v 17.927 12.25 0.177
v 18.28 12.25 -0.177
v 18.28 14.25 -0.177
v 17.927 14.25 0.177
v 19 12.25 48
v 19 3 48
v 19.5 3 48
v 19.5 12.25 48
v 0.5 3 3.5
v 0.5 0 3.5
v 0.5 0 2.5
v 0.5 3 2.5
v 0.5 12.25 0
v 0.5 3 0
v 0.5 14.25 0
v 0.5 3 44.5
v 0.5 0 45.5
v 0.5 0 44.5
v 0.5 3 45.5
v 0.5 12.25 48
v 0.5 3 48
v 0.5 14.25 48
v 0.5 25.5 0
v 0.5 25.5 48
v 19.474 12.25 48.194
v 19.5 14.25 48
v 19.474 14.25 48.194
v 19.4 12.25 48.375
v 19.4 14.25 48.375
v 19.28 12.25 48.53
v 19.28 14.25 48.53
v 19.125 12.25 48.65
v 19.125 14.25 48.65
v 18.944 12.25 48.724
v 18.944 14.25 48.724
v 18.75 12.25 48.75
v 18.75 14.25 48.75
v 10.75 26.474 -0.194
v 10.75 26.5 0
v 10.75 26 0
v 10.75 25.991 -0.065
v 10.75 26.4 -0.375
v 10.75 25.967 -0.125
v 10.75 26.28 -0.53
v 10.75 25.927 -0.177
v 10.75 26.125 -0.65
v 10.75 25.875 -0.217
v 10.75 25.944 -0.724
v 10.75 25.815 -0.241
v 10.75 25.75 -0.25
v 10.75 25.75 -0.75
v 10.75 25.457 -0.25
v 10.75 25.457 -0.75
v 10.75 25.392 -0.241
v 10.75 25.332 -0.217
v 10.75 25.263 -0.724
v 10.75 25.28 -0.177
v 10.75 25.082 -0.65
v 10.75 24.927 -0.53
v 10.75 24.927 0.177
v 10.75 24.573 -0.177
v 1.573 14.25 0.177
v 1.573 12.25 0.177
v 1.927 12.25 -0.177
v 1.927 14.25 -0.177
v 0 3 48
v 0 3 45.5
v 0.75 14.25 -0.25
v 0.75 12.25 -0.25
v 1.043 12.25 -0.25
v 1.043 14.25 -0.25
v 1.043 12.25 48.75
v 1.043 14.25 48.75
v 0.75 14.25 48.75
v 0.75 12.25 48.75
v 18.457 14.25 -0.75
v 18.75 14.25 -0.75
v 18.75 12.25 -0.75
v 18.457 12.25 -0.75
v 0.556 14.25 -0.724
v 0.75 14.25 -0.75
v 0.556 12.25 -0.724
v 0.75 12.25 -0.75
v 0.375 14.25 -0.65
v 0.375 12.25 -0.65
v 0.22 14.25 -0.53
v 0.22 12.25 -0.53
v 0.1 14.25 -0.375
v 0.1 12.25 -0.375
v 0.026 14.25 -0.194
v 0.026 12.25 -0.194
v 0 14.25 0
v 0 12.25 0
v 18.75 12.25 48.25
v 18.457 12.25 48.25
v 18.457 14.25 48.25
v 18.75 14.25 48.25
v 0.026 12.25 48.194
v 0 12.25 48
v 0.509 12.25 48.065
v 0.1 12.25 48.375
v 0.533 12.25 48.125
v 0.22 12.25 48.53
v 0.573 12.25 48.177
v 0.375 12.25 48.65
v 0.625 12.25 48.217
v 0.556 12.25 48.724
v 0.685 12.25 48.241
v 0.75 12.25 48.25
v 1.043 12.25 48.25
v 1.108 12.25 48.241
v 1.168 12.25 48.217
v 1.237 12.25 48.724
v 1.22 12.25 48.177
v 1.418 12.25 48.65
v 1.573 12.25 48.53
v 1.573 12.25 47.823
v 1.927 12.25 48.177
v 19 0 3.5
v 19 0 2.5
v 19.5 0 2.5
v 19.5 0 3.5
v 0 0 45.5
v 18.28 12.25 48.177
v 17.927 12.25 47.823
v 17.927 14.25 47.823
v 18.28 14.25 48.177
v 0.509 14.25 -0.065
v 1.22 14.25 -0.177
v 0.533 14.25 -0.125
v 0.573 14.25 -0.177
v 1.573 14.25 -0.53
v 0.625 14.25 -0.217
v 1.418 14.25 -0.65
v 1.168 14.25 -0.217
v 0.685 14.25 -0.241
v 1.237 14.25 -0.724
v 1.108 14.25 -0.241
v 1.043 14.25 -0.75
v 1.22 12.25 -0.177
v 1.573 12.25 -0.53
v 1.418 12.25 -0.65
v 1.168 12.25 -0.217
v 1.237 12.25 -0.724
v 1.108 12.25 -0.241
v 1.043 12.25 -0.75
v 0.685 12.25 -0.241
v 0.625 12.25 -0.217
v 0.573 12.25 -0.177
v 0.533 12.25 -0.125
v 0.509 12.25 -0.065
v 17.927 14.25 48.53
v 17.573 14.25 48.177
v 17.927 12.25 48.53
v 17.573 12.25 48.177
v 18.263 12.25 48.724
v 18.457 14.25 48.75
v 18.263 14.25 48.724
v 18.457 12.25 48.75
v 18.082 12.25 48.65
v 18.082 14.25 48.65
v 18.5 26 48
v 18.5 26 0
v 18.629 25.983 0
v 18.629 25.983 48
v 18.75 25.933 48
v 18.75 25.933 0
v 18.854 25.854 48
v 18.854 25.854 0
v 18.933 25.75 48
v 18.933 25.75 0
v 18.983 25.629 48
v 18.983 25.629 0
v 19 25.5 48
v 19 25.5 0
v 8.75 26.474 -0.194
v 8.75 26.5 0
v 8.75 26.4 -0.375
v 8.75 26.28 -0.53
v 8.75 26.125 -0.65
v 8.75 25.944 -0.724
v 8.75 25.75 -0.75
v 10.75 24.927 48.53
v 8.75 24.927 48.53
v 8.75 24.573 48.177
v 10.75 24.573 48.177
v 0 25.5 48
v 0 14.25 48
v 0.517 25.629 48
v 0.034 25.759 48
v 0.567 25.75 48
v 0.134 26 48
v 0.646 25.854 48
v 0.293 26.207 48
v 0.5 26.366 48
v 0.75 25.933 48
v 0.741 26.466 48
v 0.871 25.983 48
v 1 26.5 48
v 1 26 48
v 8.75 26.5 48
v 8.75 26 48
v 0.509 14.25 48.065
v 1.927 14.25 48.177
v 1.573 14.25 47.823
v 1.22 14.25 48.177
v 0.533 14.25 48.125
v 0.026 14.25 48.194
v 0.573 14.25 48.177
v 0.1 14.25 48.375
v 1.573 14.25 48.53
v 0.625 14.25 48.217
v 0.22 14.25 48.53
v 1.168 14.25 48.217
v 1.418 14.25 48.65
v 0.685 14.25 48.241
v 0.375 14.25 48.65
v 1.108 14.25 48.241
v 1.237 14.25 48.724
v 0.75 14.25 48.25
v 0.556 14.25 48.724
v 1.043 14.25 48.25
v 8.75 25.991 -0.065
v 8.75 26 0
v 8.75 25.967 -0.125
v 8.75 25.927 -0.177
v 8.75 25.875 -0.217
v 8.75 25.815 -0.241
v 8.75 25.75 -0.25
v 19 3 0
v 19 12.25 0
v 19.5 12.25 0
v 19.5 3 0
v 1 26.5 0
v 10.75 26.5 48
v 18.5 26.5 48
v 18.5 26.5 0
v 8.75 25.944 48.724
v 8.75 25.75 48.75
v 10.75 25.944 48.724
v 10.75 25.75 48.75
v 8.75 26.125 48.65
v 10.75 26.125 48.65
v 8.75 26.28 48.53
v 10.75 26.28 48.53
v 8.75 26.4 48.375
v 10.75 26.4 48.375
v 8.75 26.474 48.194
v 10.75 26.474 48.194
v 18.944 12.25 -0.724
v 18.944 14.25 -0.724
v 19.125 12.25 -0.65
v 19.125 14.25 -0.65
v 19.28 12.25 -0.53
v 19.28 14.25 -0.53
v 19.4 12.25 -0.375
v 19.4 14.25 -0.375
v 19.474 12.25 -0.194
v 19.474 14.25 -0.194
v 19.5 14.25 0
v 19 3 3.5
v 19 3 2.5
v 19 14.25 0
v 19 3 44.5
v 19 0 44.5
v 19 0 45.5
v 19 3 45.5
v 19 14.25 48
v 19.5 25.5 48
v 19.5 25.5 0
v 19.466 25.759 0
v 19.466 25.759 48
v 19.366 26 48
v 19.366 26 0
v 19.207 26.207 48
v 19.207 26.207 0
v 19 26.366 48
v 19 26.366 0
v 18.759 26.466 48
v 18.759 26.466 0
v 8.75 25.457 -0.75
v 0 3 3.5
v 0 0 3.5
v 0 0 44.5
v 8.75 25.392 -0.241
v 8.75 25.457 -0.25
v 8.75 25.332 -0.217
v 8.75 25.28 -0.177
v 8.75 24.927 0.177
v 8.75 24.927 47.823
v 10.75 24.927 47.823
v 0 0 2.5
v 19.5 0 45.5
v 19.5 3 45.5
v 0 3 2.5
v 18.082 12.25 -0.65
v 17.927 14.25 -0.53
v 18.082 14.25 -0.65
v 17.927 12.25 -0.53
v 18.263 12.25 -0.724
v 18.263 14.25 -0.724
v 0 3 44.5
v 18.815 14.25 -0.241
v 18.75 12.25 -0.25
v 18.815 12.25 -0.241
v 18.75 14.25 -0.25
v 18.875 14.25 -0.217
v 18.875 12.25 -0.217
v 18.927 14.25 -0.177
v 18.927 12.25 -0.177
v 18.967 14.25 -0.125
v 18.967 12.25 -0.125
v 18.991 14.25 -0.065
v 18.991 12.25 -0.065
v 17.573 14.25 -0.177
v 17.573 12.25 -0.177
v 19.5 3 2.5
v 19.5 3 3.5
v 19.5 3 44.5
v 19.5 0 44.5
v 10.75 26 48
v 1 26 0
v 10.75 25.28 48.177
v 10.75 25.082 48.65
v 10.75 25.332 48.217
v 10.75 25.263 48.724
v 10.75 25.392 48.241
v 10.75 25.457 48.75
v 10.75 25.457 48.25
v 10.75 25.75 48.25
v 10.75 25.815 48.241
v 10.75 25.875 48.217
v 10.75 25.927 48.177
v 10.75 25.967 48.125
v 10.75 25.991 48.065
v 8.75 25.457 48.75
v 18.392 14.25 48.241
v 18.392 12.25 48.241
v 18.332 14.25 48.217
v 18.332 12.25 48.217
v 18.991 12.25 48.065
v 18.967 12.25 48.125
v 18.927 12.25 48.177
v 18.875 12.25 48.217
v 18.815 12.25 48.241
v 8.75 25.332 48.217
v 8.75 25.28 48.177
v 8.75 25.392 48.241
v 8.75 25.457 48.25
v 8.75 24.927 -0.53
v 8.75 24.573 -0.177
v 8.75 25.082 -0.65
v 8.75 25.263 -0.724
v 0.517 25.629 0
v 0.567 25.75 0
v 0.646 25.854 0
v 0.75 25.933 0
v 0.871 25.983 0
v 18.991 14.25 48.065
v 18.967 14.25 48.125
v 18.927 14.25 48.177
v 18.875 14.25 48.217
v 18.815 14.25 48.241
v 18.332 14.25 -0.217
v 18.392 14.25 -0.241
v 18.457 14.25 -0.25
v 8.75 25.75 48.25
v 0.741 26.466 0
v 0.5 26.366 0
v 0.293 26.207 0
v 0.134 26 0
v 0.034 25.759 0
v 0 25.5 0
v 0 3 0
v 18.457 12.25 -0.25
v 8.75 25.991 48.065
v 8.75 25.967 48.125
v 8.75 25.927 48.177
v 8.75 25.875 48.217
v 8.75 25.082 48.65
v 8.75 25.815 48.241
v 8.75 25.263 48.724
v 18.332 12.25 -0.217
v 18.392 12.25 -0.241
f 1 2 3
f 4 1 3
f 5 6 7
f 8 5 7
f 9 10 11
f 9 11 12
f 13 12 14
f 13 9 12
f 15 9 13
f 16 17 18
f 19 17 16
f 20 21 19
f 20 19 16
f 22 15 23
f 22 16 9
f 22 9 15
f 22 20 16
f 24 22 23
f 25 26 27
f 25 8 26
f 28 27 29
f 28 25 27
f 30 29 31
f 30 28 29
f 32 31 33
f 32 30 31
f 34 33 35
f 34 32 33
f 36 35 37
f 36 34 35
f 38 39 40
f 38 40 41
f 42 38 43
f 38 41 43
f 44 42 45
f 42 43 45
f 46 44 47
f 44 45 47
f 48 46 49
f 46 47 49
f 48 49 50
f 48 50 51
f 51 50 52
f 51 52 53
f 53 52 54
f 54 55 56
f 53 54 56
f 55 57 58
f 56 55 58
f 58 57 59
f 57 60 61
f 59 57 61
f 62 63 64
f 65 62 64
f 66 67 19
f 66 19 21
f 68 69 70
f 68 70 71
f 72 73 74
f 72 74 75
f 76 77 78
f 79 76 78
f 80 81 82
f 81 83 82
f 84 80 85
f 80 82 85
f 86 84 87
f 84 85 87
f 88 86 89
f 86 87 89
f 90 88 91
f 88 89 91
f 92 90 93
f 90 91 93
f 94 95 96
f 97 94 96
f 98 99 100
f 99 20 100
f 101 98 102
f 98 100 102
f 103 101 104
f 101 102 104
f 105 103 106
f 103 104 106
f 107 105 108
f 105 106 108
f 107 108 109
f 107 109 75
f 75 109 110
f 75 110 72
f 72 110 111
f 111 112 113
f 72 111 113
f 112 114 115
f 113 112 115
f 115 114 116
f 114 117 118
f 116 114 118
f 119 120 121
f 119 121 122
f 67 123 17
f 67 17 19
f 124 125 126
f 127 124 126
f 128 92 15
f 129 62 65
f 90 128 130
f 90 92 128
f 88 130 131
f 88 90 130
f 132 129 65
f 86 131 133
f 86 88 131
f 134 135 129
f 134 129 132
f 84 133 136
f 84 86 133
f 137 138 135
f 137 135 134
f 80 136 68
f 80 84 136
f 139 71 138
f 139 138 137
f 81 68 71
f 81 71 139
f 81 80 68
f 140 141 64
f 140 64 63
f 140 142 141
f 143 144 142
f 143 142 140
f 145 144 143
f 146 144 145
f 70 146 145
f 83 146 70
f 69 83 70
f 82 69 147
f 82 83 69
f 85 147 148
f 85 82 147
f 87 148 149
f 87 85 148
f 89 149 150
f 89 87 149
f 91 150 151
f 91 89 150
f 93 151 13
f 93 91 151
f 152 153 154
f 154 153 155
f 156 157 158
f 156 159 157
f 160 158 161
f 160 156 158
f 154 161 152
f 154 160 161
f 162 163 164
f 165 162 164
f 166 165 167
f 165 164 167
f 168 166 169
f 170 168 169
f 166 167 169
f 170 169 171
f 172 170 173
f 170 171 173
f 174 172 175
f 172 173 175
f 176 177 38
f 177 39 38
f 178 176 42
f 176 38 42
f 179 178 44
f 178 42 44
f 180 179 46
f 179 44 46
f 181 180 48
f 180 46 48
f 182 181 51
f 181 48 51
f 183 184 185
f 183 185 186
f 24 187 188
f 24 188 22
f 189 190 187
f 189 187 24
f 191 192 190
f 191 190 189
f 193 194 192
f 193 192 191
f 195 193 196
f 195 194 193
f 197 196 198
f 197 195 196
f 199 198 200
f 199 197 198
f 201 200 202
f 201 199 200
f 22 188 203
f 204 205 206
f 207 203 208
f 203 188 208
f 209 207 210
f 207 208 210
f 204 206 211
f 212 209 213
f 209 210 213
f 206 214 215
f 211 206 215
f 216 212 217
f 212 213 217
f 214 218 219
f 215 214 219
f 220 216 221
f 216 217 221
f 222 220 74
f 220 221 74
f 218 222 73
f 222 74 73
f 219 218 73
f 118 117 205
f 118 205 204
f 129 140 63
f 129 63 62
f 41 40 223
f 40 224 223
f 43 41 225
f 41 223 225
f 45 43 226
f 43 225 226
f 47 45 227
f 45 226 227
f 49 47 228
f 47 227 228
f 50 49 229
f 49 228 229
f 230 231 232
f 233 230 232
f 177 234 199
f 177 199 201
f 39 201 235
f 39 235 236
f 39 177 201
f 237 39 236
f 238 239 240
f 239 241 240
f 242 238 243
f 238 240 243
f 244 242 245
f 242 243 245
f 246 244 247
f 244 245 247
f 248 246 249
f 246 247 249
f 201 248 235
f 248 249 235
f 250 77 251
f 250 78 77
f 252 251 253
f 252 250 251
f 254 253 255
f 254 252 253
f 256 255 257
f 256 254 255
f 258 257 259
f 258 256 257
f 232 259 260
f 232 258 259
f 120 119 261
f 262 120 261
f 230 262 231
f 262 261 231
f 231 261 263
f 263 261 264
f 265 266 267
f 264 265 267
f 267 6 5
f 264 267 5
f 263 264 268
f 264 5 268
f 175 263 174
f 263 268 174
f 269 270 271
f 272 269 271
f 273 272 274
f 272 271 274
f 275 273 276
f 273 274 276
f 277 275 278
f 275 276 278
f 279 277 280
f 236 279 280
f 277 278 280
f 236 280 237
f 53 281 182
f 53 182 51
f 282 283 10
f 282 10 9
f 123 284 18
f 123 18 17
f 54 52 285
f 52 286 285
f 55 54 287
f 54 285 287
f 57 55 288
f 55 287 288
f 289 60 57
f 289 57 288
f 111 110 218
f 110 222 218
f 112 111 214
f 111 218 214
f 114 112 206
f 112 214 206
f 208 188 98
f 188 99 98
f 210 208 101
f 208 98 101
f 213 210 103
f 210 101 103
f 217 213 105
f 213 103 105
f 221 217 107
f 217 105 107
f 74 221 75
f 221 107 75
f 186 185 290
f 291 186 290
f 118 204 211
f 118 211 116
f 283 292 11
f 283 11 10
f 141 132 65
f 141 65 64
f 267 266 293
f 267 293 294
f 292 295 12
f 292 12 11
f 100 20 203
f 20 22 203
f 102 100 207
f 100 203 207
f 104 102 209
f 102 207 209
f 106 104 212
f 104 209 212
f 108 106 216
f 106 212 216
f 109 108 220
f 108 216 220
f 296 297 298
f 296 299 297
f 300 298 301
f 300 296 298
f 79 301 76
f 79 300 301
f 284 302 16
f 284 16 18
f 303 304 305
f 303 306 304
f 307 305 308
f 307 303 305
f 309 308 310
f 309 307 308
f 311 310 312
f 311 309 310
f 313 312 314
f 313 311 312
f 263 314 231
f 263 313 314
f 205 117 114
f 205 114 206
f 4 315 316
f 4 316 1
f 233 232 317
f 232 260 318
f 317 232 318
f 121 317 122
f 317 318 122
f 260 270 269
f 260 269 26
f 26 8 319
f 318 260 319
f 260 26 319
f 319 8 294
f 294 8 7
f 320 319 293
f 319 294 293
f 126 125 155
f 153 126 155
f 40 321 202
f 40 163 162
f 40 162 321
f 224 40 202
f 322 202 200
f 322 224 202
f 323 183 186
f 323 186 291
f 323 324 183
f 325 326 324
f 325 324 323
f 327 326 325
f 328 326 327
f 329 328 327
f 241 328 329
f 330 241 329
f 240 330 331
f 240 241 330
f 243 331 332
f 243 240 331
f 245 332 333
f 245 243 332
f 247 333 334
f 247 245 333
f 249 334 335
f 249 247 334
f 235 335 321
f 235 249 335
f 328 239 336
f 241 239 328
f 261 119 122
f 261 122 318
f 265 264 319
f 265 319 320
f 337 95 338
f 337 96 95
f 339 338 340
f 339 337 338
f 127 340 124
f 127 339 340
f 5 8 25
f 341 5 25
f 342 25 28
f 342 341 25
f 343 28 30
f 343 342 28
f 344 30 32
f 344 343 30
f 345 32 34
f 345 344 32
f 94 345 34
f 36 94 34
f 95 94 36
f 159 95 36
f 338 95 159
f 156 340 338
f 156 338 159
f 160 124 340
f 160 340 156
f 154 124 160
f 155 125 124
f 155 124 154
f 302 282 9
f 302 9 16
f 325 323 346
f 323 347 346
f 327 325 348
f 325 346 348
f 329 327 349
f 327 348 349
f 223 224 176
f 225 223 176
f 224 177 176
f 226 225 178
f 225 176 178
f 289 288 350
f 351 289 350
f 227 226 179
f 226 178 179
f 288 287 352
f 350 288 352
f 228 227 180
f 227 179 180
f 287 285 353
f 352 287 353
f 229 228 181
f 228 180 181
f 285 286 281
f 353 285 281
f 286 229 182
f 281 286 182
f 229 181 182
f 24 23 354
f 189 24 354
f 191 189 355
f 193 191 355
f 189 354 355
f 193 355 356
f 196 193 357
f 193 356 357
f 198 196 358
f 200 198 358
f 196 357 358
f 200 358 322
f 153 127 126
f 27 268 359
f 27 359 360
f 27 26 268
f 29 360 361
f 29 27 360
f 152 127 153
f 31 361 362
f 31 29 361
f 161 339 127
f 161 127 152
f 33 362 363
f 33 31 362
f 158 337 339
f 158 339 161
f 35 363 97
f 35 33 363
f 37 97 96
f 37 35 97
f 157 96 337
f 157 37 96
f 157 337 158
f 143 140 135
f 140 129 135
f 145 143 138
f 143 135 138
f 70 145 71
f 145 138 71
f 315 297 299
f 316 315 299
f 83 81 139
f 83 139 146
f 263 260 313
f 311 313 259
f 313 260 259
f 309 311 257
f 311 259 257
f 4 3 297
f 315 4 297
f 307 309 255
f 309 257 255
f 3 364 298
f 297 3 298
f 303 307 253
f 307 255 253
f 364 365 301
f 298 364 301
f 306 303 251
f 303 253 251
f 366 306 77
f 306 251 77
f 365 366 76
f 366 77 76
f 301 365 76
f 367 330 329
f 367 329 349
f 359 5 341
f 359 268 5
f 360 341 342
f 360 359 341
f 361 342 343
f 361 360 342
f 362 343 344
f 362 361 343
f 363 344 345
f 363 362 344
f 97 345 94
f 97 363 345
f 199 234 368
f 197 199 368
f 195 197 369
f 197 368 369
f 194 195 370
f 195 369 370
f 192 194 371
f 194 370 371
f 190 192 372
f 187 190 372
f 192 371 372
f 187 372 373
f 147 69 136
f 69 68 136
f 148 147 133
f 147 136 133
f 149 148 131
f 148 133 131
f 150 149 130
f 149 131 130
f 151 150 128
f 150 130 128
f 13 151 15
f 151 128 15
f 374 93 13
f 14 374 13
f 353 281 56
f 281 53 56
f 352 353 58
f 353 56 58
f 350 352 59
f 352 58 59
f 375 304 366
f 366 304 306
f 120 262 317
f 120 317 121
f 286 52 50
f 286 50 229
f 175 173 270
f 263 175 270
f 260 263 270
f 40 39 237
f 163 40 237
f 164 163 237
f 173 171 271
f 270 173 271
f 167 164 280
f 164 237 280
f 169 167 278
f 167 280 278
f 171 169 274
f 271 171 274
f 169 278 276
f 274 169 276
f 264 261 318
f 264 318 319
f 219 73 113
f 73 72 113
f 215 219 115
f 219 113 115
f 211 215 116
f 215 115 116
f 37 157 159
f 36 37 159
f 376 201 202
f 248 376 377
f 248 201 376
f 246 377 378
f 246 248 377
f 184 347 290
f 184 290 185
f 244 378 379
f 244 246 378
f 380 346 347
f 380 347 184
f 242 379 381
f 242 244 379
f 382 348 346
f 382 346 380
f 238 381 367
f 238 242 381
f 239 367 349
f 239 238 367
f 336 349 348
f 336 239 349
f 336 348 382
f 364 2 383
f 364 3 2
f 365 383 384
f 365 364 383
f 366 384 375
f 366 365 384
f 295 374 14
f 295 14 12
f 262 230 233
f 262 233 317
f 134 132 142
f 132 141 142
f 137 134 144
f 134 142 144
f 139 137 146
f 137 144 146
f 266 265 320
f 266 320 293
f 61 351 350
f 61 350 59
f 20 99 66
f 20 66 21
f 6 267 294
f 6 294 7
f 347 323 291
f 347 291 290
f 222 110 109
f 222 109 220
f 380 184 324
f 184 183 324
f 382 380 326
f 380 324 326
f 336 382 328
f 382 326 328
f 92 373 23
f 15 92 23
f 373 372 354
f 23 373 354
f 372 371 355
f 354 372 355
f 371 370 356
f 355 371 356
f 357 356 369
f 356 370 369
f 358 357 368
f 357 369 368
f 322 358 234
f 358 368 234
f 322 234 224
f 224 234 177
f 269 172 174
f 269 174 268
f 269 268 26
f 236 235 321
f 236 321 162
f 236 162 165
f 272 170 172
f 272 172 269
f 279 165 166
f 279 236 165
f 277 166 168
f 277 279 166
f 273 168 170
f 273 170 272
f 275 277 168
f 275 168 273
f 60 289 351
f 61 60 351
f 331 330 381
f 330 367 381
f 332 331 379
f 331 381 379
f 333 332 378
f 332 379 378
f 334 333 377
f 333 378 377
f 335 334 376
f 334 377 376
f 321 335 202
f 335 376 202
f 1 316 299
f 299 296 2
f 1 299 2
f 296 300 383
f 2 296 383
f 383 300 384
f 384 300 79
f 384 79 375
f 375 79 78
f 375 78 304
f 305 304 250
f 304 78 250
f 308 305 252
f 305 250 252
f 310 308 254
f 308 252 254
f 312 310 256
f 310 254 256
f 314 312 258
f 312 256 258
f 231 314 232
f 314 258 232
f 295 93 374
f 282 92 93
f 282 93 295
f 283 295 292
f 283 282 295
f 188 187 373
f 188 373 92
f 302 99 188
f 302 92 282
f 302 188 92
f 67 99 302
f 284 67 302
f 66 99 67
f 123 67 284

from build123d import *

# Parameters (mm, degrees)
EXTRUDE_1_DEPTH     = 48
SKETCH_3_W          = 2
SKETCH_3_H          = 3.503465233
EXTRUDE_2_DEPTH     = 0.5
SKETCH_4_W          = 2
SKETCH_4_H          = 3.503465233
EXTRUDE_3_DEPTH     = 0.5
SKETCH_7_W          = 0.5
SKETCH_7_H          = 3.503465233
CUT_EXTRUDE_2_DEPTH = 66.5
SKETCH_10_W         = 2
SKETCH_10_H         = 0.5
CUT_EXTRUDE_3_DEPTH = 66.5
SKETCH_13_W         = 0.5
SKETCH_13_H         = 2
SKETCH_16_W         = 0.5
SKETCH_16_H         = 2


with BuildPart() as part:
    # Эскиз1 → Бобышка-Вытянуть1 (new body)
    with BuildSketch(Plane.XY):
        with BuildLine():
            Line((0.5, 0), (0.5, 25.5))
            ThreePointArc((0.5, 25.5), (0.646446609, 25.853553391), (1, 26))
            Line((1, 26), (18.5, 26))
            ThreePointArc((18.5, 26), (18.853553391, 25.853553391), (19, 25.5))
            Line((19, 25.5), (19, 0))
            Line((19, 0), (19.5, 0))
            Line((19.5, 0), (19.5, 25.5))
            ThreePointArc((19.5, 25.5), (19.207106781, 26.207106781), (18.5, 26.5))
            Line((18.5, 26.5), (1, 26.5))
            ThreePointArc((1, 26.5), (0.292893219, 26.207106781), (0, 25.5))
            Line((0, 25.5), (0, 0))
            Line((0, 0), (0.5, 0))
        make_face()
    extrude(amount=EXTRUDE_1_DEPTH)

    # Эскиз3 → Бобышка-Вытянуть2 (add)
    with BuildSketch(Plane.ZY):
        with Locations((45, -1.751732617)):
            Rectangle(SKETCH_3_W, SKETCH_3_H)
        with Locations((3, -1.751732617)):
            Rectangle(SKETCH_3_W, SKETCH_3_H)
    extrude(amount=-EXTRUDE_2_DEPTH)

    # Эскиз4 → Бобышка-Вытянуть3 (add)
    with BuildSketch(Plane(origin=(19.5, 0, 0), x_dir=(0, 0, -1), z_dir=(1, 0, 0))):
        with Locations((-45, -1.751732617)):
            Rectangle(SKETCH_4_W, SKETCH_4_H)
        with Locations((-3, -1.751732617)):
            Rectangle(SKETCH_4_W, SKETCH_4_H)
    extrude(amount=-EXTRUDE_3_DEPTH)

    # Эскиз7 → Вырез-Вытянуть2 (cut)
    with BuildSketch(Plane.ZY):
        with Locations((45.75, -1.751732617)):
            Rectangle(SKETCH_7_W, SKETCH_7_H)
        with Locations((3.75, -1.751732617)):
            Rectangle(SKETCH_7_W, SKETCH_7_H)
        with Locations((44.25, -1.751732617)):
            Rectangle(SKETCH_7_W, SKETCH_7_H)
        with Locations((2.25, -1.751732617)):
            Rectangle(SKETCH_7_W, SKETCH_7_H)
    extrude(amount=-CUT_EXTRUDE_2_DEPTH, mode=Mode.SUBTRACT)

    # По траектории2: sweep along a path in Эскиз9
    with BuildLine(Plane.ZY) as sweep_2_path:
        Line((48, 24.75), (48.353553391, 25.103553391))
        ThreePointArc((48.353553391, 25.103553391), (48.461939766, 25.265765065), (48.5, 25.457106781))
        Line((48.5, 25.457106781), (48.5, 25.75))
        ThreePointArc((48.5, 25.75), (48.353553391, 26.103553391), (48, 26.25))
        Line((48, 26.25), (0, 26.25))
        ThreePointArc((0, 26.25), (-0.353553391, 26.103553391), (-0.5, 25.75))
        Line((-0.5, 25.75), (-0.5, 25.457106781))
        ThreePointArc((-0.5, 25.457106781), (-0.461939766, 25.265765065), (-0.353553391, 25.103553391))
        Line((-0.353553391, 25.103553391), (0, 24.75))
    # Эскиз10 → По траектории2 (sweep)
    with BuildSketch(Plane(origin=(0, 24.75, 48), x_dir=(1, 0, 0), z_dir=(0, 0.7071067811865477, 0.7071067811865475))):
        with Locations((9.75, 0)):
            Rectangle(SKETCH_10_W, SKETCH_10_H)
    sweep(path=sweep_2_path.line)

    # Эскиз14 → Вырез-Вытянуть3 (cut)
    with BuildSketch(Plane.ZY):
        Polygon((2.5, 0), (3.5, 0), (3.5, 3), (44.5, 3), (44.5, 0), (45.5, 0), (45.5, 3), (48, 3), (48, 0), (46.949999013, 0), (46.949999013, -4.072410454), (1.67699977, -4.072410454), (1.67699977, 0), (0, 0), (0, 3), (2.5, 3), align=None)
    extrude(amount=-CUT_EXTRUDE_3_DEPTH, mode=Mode.SUBTRACT)

    # По траектории3: sweep along a path in Эскиз11
    with BuildLine(Plane(origin=(0, 26.5, 0), x_dir=(1, 0, 0), z_dir=(0, 1, 0))) as sweep_3_path:
        Line((17.75, 0), (18.103553391, 0.353553391))
        ThreePointArc((18.103553391, 0.353553391), (18.265765065, 0.461939766), (18.457106781, 0.5))
        Line((18.457106781, 0.5), (18.75, 0.5))
        ThreePointArc((18.75, 0.5), (19.103553391, 0.353553391), (19.25, 0))
        Line((19.25, 0), (19.25, -48))
        ThreePointArc((19.25, -48), (19.103553391, -48.353553391), (18.75, -48.5))
        Line((18.75, -48.5), (18.457106781, -48.5))
        ThreePointArc((18.457106781, -48.5), (18.265765065, -48.461939766), (18.103553391, -48.353553391))
        Line((18.103553391, -48.353553391), (17.75, -48))
    # Эскиз13 → По траектории3 (sweep)
    with BuildSketch(Plane(origin=(17.75, 26.5, 0), x_dir=(0.7071067811865498, 0, 0.7071067811865454), z_dir=(-0.7071067811865454, 0, 0.7071067811865498))):
        with Locations((0, -13.25)):
            Rectangle(SKETCH_13_W, SKETCH_13_H)
    sweep(path=sweep_3_path.line)

    # По траектории4: sweep along a path in Эскиз15
    with BuildLine(Plane(origin=(0, 26.5, 0), x_dir=(1, 0, 0), z_dir=(0, 1, 0))) as sweep_4_path:
        Line((1.75, 0), (1.396446609, 0.353553391))
        ThreePointArc((1.396446609, 0.353553391), (1.234234935, 0.461939766), (1.042893219, 0.5))
        Line((1.042893219, 0.5), (0.75, 0.5))
        ThreePointArc((0.75, 0.5), (0.396446609, 0.353553391), (0.25, 0))
        Line((0.25, 0), (0.25, -48))
        ThreePointArc((0.25, -48), (0.396446609, -48.353553391), (0.75, -48.5))
        Line((0.75, -48.5), (1.042893219, -48.5))
        ThreePointArc((1.042893219, -48.5), (1.234234935, -48.461939766), (1.396446609, -48.353553391))
        Line((1.396446609, -48.353553391), (1.75, -48))
    # Эскиз16 → По траектории4 (sweep)
    with BuildSketch(Plane(origin=(1.75, 26.5, 48), x_dir=(-0.7071067811865488, 0, -0.7071067811865464), z_dir=(0.7071067811865464, 0, -0.7071067811865488))):
        with Locations((0, -13.25)):
            Rectangle(SKETCH_16_W, SKETCH_16_H)
    sweep(path=sweep_4_path.line)


solid = part.part
